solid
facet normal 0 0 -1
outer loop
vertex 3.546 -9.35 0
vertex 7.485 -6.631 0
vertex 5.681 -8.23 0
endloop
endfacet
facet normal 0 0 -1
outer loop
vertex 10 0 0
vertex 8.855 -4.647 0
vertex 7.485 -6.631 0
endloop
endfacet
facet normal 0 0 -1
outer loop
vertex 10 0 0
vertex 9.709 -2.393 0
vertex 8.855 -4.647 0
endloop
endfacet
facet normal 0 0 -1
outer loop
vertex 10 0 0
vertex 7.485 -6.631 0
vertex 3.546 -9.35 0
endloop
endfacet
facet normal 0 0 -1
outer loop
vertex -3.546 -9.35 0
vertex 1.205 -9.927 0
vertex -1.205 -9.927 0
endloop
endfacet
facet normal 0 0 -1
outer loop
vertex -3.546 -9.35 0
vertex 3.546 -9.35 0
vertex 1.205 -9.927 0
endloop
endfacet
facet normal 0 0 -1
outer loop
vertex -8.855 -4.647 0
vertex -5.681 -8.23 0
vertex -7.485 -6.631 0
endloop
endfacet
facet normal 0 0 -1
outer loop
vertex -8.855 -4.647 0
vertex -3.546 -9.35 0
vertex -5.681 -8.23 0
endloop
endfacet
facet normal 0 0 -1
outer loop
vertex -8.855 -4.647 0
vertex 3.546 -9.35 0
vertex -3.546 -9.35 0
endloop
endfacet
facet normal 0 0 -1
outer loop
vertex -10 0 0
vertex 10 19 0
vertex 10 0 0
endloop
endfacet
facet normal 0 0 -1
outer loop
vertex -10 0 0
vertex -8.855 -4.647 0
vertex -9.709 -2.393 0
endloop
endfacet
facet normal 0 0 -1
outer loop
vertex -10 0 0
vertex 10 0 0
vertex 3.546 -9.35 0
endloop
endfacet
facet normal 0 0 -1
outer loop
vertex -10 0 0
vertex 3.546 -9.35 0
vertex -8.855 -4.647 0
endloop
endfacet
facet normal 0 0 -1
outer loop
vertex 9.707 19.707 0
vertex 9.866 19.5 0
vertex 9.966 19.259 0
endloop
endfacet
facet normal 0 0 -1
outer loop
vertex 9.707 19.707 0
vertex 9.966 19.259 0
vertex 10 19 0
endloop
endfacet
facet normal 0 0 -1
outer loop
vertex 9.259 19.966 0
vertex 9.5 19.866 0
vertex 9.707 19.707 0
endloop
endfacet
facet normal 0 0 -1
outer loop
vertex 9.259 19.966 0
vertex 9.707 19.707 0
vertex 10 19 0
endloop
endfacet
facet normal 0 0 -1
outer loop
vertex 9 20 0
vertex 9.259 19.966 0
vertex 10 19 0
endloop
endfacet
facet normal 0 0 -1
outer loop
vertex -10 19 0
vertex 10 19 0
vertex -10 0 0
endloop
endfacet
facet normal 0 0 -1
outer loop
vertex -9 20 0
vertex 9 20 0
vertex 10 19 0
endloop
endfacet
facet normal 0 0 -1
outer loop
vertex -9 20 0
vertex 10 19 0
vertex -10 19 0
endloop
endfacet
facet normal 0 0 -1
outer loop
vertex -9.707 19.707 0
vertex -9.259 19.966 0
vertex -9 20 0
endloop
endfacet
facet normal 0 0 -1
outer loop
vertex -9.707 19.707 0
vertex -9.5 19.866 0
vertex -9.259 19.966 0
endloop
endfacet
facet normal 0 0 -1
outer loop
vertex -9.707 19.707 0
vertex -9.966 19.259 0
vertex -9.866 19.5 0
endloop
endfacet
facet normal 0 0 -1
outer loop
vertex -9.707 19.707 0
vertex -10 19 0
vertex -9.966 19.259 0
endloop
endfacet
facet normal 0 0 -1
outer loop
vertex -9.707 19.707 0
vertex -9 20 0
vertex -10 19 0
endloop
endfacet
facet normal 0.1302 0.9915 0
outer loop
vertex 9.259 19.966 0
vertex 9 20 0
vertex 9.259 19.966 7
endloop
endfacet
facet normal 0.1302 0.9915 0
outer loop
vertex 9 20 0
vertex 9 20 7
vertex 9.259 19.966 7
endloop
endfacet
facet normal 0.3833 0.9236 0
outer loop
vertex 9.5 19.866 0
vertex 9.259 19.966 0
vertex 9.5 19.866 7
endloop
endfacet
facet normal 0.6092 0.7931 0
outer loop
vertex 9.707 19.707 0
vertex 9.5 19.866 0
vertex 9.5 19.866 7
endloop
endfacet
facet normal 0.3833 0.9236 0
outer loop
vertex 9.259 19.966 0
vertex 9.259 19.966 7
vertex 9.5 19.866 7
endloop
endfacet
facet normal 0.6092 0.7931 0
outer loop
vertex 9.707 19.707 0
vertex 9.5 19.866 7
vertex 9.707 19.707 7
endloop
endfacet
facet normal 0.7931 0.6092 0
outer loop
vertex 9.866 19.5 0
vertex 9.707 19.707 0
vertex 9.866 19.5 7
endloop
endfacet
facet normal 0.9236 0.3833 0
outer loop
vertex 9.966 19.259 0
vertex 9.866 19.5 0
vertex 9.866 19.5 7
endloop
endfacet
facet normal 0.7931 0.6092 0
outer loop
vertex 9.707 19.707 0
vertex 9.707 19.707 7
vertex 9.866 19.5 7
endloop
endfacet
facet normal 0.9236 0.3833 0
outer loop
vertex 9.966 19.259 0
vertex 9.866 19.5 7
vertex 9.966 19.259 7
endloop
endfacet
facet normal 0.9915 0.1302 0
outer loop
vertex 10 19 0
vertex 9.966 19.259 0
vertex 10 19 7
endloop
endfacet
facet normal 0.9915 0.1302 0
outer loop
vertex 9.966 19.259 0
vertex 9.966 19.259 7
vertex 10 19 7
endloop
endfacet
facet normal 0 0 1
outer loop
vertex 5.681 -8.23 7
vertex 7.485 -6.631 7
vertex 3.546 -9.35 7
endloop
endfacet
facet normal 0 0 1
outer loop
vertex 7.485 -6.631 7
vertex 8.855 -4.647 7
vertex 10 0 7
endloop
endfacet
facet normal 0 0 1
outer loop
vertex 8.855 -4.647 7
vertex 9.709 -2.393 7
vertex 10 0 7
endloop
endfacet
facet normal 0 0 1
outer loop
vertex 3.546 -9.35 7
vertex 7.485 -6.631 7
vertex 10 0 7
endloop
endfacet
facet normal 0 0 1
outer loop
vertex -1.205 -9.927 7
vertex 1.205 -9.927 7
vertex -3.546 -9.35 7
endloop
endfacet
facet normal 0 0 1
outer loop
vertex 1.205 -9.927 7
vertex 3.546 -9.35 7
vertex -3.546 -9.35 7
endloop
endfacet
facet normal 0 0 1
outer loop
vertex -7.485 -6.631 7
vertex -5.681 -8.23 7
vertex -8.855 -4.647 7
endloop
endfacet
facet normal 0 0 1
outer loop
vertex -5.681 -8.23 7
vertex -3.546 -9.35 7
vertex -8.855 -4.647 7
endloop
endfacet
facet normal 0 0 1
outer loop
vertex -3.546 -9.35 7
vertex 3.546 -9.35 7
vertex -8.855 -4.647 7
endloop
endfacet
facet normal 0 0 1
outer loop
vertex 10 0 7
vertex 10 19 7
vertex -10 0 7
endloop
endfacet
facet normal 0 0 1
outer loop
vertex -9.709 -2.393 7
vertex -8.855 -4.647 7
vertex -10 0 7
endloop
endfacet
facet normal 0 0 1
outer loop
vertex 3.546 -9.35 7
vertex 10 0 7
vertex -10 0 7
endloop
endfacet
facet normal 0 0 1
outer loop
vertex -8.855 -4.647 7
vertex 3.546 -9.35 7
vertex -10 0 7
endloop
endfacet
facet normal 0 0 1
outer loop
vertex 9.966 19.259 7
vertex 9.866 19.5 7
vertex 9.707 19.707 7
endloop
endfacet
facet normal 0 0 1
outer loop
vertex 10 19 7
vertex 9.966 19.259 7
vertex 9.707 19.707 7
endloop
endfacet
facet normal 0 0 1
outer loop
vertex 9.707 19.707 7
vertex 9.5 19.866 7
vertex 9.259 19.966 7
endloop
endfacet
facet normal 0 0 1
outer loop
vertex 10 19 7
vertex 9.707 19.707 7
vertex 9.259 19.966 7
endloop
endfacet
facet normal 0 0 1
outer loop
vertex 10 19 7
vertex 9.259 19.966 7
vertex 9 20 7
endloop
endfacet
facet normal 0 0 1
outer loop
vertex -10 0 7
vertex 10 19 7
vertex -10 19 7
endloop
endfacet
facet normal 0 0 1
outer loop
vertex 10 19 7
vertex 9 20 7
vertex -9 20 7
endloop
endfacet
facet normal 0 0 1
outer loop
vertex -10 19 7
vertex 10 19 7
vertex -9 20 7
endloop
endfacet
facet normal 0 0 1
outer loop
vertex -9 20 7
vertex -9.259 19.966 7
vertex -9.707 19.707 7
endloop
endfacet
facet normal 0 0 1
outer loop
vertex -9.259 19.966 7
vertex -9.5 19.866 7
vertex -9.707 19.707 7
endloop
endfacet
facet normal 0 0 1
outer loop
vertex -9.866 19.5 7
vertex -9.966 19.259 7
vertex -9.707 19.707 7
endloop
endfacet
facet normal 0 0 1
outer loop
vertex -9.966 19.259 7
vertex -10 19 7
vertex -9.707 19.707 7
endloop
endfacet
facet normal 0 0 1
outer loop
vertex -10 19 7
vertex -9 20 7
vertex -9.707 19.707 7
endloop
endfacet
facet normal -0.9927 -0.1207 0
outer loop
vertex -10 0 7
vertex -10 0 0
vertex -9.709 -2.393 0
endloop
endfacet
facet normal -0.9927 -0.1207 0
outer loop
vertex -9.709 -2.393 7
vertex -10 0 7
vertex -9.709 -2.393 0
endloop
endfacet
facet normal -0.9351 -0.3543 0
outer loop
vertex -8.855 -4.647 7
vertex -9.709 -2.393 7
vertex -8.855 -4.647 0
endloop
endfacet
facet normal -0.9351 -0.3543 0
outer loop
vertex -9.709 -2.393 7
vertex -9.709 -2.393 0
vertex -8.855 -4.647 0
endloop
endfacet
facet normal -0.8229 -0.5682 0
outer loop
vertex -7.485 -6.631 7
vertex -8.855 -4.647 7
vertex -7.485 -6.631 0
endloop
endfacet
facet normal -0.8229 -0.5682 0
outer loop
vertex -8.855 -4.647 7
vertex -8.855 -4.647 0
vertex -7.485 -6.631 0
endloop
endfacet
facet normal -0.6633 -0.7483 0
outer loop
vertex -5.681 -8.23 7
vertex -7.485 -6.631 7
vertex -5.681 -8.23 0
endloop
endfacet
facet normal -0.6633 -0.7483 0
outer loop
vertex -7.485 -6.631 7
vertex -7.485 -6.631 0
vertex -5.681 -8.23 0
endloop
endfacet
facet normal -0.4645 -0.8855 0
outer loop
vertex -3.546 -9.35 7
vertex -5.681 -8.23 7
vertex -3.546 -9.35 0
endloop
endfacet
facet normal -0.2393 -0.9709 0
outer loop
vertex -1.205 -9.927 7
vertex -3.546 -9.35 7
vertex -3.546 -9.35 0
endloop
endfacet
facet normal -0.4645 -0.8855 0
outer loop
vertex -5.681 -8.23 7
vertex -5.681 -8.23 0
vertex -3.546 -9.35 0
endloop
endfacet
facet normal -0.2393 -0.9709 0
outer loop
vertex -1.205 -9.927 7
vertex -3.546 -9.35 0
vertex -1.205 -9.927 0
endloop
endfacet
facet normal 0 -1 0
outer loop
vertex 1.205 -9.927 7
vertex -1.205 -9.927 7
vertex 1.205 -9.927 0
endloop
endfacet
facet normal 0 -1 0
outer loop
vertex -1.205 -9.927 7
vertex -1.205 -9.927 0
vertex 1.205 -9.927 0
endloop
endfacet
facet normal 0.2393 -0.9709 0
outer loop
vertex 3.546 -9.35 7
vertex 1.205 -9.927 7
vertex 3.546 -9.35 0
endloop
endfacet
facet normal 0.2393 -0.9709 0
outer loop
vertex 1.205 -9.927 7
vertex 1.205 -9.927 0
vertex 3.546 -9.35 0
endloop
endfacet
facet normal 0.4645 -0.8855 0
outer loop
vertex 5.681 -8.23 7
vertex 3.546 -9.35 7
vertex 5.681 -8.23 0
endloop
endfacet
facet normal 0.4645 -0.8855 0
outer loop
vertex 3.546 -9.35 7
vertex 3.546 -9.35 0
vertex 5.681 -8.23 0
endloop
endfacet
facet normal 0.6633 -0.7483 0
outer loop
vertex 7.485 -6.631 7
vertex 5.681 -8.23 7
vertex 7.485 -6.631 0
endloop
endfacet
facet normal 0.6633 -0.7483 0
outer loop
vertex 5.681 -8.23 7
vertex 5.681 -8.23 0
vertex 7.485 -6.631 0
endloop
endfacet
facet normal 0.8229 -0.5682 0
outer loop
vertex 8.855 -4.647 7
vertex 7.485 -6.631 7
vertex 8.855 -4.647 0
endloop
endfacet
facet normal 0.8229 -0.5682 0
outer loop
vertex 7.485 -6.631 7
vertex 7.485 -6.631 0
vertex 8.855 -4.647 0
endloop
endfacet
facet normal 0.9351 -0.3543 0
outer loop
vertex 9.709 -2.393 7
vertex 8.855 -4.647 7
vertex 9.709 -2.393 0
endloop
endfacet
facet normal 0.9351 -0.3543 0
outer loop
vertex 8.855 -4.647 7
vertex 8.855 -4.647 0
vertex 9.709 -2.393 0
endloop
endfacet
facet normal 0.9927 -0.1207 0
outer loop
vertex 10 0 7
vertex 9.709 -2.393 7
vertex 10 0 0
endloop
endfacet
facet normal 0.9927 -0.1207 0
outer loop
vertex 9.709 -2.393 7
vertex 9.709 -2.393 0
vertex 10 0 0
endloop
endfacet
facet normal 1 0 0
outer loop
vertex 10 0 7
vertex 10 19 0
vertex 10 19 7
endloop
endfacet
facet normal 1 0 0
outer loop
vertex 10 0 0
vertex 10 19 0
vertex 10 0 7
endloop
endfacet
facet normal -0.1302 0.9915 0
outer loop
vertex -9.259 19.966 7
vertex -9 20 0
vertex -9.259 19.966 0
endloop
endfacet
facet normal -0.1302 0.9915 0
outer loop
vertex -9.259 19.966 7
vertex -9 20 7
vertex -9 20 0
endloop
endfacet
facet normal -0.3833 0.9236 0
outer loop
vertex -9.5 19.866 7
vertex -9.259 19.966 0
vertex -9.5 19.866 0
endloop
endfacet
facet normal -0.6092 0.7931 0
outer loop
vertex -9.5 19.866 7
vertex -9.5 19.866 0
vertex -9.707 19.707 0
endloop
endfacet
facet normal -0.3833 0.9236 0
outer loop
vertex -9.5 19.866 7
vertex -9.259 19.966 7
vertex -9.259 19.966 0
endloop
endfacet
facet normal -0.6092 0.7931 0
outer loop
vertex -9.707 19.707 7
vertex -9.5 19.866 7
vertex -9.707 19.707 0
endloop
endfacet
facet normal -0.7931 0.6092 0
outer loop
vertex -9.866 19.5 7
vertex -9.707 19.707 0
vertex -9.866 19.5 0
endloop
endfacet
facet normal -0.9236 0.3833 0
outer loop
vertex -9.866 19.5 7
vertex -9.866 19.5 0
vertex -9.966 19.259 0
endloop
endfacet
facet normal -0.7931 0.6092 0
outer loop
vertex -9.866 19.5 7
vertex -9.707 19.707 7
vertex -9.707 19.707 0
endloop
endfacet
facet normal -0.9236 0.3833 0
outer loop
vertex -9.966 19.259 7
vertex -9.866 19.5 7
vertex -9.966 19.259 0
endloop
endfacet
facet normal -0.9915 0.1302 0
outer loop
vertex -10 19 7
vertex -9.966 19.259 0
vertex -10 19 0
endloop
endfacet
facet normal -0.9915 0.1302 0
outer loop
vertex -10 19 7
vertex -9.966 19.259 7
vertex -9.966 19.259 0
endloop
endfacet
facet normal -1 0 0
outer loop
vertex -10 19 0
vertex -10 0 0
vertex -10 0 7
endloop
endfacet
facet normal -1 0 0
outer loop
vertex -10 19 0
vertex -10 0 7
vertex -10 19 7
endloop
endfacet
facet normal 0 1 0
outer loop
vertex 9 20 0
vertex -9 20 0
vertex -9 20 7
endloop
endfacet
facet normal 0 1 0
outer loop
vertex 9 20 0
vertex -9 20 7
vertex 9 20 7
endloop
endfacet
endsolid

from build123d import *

# Parameters (mm, degrees)
PAD_DEPTH = 7
FILLET_R  = 1


with BuildPart() as part:
    # Sketch → Pad (new body)
    with BuildSketch(Plane.XY):
        with BuildLine():
            Line((-10, 20), (10, 20))
            Line((10, 20), (10, 0))
            ThreePointArc((-10, 0), (0, -10), (10, 0))
            Line((-10, 0), (-10, 20))
        make_face()
    extrude(amount=PAD_DEPTH)

    # Fillet
    fillet_edges = [part.edges().sort_by_distance(p)[0] for p in [
        (-10, 20, 3.5),
        (10, 20, 3.5),
    ]]
    fillet(fillet_edges, radius=FILLET_R)


solid = part.part
